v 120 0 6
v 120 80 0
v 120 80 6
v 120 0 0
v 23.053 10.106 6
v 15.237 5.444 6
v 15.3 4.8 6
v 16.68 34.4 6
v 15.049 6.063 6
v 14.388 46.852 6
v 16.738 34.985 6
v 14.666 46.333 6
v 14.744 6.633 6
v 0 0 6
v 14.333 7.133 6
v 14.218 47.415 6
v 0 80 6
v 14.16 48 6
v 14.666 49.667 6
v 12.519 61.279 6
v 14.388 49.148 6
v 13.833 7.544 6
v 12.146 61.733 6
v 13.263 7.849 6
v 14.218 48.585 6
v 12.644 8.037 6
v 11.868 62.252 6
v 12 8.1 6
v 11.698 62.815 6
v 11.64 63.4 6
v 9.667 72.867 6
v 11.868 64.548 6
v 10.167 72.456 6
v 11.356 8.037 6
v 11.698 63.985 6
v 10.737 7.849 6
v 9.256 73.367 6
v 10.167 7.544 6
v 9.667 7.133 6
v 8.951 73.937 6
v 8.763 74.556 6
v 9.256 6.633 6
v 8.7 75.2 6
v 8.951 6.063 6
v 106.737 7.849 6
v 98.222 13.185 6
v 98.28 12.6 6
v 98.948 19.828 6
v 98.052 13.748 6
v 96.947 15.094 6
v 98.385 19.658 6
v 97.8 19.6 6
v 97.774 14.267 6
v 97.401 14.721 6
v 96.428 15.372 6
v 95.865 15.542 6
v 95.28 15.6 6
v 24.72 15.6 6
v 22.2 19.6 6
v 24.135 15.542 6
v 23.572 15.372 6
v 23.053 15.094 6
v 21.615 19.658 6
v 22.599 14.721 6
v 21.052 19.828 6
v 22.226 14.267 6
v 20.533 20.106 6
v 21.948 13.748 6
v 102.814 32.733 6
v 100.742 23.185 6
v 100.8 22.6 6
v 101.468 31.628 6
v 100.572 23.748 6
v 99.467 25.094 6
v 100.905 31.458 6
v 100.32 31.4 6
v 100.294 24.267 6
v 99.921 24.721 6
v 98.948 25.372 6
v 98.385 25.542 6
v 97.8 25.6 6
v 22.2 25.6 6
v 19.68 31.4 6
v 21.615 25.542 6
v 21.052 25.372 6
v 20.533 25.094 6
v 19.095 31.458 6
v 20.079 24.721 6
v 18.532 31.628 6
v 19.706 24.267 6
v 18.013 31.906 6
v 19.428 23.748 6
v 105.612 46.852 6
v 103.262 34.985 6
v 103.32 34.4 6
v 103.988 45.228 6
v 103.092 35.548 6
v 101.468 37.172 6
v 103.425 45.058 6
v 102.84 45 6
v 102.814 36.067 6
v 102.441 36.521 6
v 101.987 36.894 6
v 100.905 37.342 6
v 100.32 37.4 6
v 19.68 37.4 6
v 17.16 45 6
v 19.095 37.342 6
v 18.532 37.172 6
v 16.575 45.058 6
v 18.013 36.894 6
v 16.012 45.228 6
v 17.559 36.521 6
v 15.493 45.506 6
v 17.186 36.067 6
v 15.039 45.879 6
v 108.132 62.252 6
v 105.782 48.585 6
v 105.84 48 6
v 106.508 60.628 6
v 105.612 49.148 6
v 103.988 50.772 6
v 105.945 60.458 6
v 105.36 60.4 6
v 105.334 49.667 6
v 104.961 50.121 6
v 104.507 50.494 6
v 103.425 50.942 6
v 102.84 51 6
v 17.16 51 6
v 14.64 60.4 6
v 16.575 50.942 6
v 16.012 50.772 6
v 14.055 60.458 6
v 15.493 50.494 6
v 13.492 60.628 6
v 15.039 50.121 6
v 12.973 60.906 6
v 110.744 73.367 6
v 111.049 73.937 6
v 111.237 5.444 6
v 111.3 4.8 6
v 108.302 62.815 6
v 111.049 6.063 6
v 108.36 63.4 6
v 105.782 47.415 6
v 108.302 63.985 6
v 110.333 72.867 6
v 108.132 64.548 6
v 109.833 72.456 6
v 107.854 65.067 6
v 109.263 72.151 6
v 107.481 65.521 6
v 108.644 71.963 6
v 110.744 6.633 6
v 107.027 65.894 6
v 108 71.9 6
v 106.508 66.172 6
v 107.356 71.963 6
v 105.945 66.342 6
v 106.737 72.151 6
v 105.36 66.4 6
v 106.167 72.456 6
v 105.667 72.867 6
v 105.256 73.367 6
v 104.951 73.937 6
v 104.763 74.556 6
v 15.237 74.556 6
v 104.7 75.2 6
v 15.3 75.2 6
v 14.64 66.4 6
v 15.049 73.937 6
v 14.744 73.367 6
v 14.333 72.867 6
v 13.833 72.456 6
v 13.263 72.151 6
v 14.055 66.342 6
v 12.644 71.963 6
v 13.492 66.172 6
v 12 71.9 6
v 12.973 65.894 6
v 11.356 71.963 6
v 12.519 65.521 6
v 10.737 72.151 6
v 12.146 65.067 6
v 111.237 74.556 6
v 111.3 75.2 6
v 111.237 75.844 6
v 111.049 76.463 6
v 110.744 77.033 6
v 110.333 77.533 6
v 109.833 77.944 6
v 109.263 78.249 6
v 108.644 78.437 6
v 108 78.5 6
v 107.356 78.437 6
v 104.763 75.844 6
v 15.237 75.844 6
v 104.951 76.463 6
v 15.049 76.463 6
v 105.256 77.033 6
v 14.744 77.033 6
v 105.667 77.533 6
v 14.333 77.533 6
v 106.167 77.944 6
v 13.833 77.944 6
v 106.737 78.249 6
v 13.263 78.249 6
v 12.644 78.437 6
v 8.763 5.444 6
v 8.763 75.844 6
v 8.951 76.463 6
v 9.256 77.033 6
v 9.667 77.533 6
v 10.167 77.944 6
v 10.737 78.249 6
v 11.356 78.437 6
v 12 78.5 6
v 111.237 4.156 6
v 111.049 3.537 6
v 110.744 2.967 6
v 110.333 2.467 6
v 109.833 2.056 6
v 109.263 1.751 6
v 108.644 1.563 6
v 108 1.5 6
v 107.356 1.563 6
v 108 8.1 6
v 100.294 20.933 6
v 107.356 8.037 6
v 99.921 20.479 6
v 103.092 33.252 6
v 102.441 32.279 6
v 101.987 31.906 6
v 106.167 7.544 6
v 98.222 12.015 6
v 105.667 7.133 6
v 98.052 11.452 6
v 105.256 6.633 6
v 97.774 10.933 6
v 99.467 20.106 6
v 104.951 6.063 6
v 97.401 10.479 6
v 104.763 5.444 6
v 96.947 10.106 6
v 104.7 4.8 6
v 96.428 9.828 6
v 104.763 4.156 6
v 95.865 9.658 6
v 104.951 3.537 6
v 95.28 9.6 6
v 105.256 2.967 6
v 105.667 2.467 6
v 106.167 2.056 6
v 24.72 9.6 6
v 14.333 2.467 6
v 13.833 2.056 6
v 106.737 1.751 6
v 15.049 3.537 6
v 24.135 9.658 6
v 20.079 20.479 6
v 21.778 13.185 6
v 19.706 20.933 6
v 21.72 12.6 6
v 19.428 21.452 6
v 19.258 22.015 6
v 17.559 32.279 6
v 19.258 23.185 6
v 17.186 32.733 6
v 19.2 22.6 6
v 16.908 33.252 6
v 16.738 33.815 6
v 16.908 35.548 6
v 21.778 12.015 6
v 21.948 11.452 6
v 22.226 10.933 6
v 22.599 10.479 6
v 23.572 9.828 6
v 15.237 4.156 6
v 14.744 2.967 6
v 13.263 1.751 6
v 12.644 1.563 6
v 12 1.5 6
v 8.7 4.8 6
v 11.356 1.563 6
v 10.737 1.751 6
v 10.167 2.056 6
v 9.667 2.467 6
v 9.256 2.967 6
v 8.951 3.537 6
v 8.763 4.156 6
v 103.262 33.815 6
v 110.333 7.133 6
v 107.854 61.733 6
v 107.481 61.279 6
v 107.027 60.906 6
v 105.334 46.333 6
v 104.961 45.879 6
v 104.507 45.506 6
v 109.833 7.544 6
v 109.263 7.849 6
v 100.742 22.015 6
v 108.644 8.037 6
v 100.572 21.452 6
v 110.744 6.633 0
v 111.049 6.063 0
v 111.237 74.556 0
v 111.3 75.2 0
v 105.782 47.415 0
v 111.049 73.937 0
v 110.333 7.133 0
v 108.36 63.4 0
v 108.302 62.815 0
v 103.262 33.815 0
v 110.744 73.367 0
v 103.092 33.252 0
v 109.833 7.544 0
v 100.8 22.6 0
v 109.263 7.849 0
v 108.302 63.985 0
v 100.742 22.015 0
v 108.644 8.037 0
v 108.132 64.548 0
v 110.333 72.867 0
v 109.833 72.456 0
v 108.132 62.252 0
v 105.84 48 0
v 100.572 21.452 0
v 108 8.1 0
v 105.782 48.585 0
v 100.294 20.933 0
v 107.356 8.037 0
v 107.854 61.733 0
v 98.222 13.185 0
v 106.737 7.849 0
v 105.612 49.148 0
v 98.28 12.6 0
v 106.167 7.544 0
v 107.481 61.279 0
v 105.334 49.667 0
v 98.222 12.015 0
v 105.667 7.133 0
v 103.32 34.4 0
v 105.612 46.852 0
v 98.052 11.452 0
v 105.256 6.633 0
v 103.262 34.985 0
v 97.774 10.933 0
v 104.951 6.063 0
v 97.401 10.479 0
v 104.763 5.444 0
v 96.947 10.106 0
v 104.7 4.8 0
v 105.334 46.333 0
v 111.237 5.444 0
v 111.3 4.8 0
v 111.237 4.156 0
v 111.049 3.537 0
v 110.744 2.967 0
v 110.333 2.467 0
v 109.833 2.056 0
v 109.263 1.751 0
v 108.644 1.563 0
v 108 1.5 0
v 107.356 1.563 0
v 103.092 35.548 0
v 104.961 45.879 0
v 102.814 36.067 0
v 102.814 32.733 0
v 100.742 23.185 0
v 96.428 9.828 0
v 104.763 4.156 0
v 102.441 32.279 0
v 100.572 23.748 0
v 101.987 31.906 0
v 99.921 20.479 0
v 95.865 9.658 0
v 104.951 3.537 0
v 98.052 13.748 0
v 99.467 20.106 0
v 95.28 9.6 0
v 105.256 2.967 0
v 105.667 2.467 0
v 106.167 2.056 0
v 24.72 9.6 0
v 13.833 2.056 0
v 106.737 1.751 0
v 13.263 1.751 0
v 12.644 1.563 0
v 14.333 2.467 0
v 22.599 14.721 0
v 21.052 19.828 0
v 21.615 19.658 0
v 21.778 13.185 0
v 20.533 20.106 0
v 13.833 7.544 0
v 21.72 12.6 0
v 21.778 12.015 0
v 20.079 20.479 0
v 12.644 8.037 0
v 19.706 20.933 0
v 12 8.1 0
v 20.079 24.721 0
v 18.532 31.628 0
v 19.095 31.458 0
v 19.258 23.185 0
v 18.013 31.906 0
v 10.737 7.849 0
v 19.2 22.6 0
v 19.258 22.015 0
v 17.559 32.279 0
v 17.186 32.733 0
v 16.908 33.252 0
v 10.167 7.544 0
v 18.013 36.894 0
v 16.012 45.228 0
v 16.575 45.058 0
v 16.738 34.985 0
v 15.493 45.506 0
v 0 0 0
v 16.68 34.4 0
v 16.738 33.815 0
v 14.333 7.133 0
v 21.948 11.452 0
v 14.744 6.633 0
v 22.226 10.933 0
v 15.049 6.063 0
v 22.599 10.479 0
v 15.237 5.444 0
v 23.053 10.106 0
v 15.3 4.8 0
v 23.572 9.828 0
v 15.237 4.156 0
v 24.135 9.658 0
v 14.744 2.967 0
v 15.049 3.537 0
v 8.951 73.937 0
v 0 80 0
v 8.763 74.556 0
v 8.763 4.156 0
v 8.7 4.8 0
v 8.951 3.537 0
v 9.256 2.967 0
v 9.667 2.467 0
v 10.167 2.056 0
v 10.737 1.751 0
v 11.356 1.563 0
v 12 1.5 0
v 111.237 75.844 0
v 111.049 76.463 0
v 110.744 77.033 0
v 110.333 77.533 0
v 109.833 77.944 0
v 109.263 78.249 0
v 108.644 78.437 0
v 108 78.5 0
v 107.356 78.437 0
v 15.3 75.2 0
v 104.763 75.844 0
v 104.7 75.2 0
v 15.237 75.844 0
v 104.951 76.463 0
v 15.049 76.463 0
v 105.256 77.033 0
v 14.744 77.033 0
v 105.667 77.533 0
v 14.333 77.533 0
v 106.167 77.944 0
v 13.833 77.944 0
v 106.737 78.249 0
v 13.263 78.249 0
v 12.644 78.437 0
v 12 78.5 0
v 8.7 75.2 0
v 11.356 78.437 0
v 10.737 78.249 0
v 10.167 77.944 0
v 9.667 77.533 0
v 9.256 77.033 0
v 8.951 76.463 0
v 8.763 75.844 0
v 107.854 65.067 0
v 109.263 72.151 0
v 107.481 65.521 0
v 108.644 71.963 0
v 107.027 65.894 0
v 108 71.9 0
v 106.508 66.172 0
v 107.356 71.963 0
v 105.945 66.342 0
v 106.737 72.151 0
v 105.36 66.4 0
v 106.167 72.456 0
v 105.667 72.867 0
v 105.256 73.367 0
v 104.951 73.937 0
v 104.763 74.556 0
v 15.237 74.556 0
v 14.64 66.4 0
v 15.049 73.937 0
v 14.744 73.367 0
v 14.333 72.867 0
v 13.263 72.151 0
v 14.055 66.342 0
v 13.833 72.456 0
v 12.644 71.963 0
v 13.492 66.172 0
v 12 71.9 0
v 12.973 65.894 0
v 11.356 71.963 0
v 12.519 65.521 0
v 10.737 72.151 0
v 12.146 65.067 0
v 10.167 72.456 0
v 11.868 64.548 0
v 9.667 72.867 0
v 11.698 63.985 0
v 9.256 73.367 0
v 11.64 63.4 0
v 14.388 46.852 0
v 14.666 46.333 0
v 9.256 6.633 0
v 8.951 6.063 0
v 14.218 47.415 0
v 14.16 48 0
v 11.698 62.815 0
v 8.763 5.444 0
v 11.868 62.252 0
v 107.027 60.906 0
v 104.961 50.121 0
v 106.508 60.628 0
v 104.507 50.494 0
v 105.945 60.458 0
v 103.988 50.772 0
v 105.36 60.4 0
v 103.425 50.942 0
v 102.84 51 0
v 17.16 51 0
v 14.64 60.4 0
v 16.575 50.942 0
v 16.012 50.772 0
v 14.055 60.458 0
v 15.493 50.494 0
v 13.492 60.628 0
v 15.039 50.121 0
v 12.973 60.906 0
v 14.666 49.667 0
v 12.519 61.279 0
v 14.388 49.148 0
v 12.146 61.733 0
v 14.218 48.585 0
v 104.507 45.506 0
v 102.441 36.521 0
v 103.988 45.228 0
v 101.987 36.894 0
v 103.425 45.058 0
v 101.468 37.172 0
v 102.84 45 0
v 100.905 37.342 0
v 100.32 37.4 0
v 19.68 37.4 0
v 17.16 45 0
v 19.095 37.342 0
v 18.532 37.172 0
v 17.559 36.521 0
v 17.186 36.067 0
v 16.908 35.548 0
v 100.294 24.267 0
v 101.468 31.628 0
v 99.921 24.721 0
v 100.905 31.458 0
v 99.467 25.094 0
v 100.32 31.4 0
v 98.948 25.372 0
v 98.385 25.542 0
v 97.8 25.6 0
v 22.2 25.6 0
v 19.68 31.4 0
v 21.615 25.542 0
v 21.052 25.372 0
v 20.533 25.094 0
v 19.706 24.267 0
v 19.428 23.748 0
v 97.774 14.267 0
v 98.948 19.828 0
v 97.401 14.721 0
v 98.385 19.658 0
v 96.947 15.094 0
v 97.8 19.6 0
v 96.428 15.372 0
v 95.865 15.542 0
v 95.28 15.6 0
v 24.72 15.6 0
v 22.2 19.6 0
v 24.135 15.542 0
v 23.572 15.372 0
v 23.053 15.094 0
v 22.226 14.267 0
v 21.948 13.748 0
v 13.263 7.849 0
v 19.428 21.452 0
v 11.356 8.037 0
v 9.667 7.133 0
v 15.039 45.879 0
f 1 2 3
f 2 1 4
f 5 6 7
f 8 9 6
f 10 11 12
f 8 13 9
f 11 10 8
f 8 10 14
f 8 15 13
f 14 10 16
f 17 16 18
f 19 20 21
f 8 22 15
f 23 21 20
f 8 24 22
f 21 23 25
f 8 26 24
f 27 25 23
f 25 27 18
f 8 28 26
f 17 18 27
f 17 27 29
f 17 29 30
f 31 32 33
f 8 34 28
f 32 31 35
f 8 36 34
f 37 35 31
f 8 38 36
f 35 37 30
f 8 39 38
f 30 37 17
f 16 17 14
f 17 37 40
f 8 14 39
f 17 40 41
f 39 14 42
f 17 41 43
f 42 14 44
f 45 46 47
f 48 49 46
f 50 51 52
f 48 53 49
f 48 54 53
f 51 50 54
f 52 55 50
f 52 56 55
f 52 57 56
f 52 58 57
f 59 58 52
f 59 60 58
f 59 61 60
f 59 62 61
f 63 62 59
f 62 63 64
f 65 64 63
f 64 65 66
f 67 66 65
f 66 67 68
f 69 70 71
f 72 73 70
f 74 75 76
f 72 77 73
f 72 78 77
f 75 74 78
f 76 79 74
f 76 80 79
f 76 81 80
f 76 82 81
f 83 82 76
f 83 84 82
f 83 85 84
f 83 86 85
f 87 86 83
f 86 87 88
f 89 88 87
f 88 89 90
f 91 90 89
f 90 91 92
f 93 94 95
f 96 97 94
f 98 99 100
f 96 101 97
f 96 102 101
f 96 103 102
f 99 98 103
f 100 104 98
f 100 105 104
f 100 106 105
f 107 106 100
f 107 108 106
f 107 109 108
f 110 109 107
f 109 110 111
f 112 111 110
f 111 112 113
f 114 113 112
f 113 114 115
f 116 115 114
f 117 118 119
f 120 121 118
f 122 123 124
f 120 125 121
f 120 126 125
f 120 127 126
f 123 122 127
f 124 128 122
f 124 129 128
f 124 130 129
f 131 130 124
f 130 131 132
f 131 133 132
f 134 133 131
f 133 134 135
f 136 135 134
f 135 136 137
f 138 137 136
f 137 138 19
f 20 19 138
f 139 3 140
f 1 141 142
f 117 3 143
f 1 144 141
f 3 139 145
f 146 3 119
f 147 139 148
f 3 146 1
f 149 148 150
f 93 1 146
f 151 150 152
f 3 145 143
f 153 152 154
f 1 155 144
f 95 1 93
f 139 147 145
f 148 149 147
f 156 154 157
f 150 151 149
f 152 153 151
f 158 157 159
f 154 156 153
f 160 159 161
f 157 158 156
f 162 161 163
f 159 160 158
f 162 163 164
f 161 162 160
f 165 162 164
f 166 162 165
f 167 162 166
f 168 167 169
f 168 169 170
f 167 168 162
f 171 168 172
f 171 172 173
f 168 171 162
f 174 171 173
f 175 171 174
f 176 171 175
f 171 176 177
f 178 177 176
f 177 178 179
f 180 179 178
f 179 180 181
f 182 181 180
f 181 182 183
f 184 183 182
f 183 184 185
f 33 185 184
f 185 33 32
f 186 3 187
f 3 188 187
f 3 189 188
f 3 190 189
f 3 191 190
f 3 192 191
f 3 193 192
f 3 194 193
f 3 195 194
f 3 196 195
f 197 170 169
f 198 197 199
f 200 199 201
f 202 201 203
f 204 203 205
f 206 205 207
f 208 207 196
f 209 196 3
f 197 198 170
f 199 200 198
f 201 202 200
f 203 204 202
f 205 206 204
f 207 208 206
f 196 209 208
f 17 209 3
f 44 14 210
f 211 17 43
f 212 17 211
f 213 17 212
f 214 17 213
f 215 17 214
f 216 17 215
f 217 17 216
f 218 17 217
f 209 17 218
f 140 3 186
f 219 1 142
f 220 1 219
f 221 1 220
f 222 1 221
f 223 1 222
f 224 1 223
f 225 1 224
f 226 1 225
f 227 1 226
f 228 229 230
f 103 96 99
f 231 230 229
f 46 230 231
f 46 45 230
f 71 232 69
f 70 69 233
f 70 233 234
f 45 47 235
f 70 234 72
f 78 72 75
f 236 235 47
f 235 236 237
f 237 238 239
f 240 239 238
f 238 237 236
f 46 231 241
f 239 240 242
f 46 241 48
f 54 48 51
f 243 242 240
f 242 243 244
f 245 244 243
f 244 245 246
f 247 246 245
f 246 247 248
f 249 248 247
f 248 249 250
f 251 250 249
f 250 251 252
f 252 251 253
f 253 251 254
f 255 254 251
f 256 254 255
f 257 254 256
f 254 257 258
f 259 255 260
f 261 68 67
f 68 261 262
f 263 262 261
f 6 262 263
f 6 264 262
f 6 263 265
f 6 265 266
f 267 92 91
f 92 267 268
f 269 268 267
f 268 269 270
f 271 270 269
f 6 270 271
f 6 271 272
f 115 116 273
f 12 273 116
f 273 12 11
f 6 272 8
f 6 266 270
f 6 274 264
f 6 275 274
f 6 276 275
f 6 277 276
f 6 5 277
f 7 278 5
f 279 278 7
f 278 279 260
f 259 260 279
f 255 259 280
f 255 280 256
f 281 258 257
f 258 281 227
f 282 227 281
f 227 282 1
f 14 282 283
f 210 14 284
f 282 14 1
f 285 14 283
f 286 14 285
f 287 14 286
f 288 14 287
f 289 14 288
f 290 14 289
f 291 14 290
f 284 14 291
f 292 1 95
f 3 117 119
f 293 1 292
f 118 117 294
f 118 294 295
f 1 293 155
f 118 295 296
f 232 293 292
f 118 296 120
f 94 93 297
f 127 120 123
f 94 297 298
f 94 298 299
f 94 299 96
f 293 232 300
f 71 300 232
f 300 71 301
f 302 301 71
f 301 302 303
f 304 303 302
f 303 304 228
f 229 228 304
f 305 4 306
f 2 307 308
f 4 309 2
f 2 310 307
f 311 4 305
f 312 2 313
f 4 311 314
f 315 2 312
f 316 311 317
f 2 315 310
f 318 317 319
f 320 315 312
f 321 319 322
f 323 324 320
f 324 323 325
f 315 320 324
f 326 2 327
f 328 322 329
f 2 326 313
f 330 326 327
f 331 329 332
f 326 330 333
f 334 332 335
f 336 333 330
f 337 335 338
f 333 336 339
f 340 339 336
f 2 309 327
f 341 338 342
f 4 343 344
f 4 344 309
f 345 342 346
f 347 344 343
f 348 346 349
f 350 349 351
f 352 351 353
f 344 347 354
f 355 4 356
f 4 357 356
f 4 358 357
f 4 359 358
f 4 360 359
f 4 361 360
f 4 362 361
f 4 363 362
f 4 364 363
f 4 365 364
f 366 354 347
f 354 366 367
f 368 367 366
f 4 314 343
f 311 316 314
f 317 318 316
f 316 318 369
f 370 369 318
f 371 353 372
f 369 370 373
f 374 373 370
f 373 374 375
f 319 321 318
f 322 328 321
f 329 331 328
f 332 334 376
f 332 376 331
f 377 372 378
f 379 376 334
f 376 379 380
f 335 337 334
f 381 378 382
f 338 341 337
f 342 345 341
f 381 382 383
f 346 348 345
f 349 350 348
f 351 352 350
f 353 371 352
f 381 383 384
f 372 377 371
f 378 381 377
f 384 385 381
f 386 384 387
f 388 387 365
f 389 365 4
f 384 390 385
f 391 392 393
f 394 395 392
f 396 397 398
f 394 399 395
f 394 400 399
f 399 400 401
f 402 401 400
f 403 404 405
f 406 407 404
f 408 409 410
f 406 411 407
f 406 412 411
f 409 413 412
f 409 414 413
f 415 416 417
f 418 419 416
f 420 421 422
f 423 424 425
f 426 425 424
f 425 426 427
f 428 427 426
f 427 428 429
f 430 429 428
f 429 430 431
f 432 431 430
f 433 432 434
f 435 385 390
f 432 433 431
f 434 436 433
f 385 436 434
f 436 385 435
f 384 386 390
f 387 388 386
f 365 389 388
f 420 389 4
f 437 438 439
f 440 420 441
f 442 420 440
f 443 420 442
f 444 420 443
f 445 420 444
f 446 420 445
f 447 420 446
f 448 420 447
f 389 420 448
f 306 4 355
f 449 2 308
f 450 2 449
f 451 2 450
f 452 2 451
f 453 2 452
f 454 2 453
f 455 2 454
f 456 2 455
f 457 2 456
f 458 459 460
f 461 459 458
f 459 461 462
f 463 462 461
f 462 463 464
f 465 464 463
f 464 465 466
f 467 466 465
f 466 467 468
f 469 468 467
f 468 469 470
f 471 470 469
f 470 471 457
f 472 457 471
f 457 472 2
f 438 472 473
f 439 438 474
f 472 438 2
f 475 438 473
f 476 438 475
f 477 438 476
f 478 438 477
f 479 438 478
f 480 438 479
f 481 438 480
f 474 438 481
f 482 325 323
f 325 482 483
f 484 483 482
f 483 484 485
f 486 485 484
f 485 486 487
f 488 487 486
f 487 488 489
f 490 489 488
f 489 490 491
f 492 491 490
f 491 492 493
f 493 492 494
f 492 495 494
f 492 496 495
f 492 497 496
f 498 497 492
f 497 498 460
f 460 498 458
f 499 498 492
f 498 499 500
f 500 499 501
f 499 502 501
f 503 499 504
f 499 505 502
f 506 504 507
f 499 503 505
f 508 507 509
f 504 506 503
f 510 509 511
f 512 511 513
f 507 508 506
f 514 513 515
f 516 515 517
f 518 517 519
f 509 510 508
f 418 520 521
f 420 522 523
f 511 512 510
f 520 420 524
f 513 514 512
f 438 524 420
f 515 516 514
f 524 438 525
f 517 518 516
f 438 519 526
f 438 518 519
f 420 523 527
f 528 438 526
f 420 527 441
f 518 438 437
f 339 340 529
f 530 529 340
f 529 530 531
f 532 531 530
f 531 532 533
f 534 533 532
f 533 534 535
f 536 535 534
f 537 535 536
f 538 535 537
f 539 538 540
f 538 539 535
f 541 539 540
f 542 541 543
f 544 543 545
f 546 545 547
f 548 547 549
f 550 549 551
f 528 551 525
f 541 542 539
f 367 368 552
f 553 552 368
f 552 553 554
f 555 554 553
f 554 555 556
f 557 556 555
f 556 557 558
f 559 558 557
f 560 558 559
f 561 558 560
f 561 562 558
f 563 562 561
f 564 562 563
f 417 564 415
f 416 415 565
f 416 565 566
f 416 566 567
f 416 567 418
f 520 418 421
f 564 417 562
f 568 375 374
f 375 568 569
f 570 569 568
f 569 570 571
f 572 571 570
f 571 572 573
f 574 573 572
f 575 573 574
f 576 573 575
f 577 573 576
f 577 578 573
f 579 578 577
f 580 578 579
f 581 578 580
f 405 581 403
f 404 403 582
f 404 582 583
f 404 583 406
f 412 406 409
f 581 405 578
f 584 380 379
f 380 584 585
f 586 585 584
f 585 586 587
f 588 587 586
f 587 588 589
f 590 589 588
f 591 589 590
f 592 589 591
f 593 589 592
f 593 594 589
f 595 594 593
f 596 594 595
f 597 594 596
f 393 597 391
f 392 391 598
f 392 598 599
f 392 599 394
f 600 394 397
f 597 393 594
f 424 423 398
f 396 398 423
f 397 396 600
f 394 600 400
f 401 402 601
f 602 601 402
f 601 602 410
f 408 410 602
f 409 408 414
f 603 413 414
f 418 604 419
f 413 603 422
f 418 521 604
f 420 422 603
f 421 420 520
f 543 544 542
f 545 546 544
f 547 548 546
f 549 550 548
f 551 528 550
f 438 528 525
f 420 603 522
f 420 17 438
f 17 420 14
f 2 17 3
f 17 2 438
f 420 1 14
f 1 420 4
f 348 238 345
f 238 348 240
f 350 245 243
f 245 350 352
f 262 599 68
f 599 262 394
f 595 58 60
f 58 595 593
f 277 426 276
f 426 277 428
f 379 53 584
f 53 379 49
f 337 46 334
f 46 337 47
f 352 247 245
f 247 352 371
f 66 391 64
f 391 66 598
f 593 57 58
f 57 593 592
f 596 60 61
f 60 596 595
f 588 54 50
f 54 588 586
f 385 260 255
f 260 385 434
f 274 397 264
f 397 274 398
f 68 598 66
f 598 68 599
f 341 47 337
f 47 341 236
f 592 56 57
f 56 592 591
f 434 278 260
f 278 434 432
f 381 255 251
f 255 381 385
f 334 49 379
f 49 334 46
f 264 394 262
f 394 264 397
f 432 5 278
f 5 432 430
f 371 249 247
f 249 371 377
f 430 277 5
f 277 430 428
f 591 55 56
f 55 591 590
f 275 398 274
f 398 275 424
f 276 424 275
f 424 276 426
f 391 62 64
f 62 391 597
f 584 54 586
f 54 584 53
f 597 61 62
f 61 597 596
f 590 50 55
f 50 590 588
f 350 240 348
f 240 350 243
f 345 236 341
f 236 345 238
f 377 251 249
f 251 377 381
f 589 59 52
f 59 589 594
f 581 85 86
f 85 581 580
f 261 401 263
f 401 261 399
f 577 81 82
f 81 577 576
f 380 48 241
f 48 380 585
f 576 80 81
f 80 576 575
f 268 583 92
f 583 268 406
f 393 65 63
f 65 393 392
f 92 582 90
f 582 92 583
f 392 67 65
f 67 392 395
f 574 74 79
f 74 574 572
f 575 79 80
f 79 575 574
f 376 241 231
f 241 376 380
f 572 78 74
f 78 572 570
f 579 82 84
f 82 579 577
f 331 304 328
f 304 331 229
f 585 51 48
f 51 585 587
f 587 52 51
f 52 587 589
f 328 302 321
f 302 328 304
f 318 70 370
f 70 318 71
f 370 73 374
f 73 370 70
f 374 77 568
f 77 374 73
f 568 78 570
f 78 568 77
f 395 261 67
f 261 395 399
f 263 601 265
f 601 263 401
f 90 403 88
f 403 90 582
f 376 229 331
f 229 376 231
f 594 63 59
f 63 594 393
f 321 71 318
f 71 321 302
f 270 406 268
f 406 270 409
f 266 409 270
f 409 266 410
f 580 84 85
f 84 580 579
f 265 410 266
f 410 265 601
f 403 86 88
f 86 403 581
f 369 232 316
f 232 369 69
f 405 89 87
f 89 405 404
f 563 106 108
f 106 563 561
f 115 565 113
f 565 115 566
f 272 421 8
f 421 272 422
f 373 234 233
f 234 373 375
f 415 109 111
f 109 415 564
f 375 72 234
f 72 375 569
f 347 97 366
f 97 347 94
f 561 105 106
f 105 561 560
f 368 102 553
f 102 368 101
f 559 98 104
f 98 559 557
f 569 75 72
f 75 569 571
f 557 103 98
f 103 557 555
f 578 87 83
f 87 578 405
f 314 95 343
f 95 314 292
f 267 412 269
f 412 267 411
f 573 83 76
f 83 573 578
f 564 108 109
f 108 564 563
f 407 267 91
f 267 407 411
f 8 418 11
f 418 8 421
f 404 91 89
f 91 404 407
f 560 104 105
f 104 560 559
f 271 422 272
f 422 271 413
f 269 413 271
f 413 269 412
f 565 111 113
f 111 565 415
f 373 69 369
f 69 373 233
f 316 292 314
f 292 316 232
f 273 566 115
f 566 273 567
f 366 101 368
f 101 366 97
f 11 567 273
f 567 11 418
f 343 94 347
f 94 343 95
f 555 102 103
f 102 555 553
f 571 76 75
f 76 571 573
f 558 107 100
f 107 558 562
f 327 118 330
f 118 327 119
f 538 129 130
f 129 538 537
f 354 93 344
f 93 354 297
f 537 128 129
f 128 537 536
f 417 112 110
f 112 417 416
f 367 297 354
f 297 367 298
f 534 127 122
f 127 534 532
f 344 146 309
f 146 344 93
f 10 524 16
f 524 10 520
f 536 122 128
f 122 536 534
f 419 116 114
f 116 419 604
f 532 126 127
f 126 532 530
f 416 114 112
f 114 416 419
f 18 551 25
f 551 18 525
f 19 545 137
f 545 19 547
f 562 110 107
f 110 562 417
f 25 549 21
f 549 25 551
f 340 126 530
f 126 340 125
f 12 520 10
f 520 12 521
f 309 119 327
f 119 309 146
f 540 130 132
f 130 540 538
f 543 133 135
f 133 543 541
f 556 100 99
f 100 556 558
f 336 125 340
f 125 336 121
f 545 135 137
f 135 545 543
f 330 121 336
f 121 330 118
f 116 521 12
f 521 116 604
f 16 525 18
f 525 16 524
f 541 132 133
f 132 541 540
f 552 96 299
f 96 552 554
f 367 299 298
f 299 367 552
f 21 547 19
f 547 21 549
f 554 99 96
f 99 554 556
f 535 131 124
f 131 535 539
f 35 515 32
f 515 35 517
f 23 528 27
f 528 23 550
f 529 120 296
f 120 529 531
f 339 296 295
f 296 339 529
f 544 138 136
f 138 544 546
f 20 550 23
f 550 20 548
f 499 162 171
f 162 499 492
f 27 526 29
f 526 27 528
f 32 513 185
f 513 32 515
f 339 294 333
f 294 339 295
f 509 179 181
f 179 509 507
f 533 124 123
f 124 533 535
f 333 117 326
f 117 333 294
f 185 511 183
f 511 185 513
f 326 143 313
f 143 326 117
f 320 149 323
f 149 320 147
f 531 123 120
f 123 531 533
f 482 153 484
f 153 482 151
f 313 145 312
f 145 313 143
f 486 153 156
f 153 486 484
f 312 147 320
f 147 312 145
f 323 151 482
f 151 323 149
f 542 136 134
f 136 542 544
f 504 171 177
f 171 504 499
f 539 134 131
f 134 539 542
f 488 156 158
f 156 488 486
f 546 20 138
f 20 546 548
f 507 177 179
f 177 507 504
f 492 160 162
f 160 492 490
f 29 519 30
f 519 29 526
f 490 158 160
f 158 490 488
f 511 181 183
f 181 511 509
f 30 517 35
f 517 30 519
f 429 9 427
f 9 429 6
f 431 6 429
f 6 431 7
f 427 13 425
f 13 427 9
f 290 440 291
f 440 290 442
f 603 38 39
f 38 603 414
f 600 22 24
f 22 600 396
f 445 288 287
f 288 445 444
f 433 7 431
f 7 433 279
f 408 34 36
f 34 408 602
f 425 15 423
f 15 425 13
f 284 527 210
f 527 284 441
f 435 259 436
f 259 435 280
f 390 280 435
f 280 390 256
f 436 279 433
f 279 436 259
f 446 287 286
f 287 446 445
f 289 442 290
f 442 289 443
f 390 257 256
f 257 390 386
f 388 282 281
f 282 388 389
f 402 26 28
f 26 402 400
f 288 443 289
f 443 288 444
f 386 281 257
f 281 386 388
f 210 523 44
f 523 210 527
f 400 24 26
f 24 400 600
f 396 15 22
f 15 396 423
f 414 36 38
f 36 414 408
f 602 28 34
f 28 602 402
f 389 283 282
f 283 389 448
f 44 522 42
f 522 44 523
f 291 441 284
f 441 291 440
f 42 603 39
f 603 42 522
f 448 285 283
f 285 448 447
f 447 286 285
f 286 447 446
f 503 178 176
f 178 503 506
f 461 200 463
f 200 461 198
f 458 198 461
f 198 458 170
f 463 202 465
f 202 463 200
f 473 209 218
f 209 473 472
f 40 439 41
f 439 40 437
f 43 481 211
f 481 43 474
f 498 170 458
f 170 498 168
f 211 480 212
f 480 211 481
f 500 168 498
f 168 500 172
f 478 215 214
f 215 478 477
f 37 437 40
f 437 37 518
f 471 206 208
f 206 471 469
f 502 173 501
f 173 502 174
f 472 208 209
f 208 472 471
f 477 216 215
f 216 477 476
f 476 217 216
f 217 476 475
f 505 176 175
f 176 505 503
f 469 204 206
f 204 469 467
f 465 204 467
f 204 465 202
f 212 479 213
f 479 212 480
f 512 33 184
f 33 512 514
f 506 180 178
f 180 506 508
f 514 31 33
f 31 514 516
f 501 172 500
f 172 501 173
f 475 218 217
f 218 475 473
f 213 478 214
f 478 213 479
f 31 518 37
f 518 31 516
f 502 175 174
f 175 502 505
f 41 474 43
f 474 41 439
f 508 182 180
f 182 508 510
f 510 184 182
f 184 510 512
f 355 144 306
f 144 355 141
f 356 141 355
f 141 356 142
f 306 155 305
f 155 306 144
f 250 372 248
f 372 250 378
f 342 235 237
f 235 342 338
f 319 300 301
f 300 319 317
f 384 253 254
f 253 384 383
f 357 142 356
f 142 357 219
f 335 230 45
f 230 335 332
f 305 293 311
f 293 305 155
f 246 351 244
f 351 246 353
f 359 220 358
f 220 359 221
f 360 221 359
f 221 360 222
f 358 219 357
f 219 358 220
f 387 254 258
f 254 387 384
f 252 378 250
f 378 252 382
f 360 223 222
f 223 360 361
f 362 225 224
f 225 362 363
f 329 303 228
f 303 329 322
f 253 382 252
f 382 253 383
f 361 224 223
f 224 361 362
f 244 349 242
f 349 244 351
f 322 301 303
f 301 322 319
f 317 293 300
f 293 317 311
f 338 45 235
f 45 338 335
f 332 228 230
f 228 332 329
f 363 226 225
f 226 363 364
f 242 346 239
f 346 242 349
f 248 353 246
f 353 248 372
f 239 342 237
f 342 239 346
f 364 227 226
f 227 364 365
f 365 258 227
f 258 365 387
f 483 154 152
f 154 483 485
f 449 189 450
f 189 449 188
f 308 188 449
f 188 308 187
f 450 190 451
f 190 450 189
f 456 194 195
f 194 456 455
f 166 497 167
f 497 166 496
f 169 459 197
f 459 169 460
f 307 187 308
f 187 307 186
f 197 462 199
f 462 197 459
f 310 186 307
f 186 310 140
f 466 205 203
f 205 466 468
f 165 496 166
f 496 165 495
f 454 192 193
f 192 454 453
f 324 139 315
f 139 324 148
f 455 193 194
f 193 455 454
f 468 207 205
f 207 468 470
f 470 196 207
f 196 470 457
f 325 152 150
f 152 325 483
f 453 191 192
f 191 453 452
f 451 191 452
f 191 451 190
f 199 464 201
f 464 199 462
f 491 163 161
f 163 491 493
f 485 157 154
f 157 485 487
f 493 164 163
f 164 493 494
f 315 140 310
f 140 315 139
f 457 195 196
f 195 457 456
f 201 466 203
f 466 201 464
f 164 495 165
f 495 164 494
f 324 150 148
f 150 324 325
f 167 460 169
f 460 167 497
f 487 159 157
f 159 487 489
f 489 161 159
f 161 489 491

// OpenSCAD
$fn = 32;

// ----------------------------------------------------------------------
// Slotted panel: 120 x 80 mm, 5 рядов of slots
// ----------------------------------------------------------------------

// --- parameters (mm) ---
panel_w = 120;            // panel width
panel_d = 80;             // panel depth
thick = 6;                // panel thickness
slot_w = 6;               // slot width
pitch0 = 10;              // first row pitch
pitch_step = 1.8;         // pitch increase per row
margin = 9.6;             // margin around the slot field
rows = 5;                 // number of slot rows
mount_d = 6.6;            // mounting holes
mount_x = 48;             // mounting hole offset

difference() {
  union() {
    cube([panel_w, panel_d, thick]);
  }
  /* slot rows: stadium shaped cutters, 2.5 mm clear of both faces */
  /* row 0: pitch 10, length 70.56 */
  hull() {
    translate([24.72, 12.6, -2.5]) cylinder(h = thick + 5, d = slot_w);
    translate([95.28, 12.6, -2.5]) cylinder(h = thick + 5, d = slot_w);
  }
  /* row 1: pitch 11.8, length 75.6 */
  hull() {
    translate([22.2, 22.6, -2.5]) cylinder(h = thick + 5, d = slot_w);
    translate([97.8, 22.6, -2.5]) cylinder(h = thick + 5, d = slot_w);
  }
  /* row 2: pitch 13.6, length 80.64 */
  hull() {
    translate([19.68, 34.4, -2.5]) cylinder(h = thick + 5, d = slot_w);
    translate([100.32, 34.4, -2.5]) cylinder(h = thick + 5, d = slot_w);
  }
  /* row 3: pitch 15.4, length 85.68 */
  hull() {
    translate([17.16, 48, -2.5]) cylinder(h = thick + 5, d = slot_w);
    translate([102.84, 48, -2.5]) cylinder(h = thick + 5, d = slot_w);
  }
  /* row 4: pitch 17.2, length 90.72 */
  hull() {
    translate([14.64, 63.4, -2.5]) cylinder(h = thick + 5, d = slot_w);
    translate([105.36, 63.4, -2.5]) cylinder(h = thick + 5, d = slot_w);
  }
  translate([12, 4.8, -2.5]) cylinder(h = 11, d = mount_d);
  translate([12, 75.2, -2.5]) cylinder(h = 11, d = mount_d);
  translate([108, 4.8, -2.5]) cylinder(h = 11, d = mount_d);
  translate([108, 75.2, -2.5]) cylinder(h = 11, d = mount_d);
}
